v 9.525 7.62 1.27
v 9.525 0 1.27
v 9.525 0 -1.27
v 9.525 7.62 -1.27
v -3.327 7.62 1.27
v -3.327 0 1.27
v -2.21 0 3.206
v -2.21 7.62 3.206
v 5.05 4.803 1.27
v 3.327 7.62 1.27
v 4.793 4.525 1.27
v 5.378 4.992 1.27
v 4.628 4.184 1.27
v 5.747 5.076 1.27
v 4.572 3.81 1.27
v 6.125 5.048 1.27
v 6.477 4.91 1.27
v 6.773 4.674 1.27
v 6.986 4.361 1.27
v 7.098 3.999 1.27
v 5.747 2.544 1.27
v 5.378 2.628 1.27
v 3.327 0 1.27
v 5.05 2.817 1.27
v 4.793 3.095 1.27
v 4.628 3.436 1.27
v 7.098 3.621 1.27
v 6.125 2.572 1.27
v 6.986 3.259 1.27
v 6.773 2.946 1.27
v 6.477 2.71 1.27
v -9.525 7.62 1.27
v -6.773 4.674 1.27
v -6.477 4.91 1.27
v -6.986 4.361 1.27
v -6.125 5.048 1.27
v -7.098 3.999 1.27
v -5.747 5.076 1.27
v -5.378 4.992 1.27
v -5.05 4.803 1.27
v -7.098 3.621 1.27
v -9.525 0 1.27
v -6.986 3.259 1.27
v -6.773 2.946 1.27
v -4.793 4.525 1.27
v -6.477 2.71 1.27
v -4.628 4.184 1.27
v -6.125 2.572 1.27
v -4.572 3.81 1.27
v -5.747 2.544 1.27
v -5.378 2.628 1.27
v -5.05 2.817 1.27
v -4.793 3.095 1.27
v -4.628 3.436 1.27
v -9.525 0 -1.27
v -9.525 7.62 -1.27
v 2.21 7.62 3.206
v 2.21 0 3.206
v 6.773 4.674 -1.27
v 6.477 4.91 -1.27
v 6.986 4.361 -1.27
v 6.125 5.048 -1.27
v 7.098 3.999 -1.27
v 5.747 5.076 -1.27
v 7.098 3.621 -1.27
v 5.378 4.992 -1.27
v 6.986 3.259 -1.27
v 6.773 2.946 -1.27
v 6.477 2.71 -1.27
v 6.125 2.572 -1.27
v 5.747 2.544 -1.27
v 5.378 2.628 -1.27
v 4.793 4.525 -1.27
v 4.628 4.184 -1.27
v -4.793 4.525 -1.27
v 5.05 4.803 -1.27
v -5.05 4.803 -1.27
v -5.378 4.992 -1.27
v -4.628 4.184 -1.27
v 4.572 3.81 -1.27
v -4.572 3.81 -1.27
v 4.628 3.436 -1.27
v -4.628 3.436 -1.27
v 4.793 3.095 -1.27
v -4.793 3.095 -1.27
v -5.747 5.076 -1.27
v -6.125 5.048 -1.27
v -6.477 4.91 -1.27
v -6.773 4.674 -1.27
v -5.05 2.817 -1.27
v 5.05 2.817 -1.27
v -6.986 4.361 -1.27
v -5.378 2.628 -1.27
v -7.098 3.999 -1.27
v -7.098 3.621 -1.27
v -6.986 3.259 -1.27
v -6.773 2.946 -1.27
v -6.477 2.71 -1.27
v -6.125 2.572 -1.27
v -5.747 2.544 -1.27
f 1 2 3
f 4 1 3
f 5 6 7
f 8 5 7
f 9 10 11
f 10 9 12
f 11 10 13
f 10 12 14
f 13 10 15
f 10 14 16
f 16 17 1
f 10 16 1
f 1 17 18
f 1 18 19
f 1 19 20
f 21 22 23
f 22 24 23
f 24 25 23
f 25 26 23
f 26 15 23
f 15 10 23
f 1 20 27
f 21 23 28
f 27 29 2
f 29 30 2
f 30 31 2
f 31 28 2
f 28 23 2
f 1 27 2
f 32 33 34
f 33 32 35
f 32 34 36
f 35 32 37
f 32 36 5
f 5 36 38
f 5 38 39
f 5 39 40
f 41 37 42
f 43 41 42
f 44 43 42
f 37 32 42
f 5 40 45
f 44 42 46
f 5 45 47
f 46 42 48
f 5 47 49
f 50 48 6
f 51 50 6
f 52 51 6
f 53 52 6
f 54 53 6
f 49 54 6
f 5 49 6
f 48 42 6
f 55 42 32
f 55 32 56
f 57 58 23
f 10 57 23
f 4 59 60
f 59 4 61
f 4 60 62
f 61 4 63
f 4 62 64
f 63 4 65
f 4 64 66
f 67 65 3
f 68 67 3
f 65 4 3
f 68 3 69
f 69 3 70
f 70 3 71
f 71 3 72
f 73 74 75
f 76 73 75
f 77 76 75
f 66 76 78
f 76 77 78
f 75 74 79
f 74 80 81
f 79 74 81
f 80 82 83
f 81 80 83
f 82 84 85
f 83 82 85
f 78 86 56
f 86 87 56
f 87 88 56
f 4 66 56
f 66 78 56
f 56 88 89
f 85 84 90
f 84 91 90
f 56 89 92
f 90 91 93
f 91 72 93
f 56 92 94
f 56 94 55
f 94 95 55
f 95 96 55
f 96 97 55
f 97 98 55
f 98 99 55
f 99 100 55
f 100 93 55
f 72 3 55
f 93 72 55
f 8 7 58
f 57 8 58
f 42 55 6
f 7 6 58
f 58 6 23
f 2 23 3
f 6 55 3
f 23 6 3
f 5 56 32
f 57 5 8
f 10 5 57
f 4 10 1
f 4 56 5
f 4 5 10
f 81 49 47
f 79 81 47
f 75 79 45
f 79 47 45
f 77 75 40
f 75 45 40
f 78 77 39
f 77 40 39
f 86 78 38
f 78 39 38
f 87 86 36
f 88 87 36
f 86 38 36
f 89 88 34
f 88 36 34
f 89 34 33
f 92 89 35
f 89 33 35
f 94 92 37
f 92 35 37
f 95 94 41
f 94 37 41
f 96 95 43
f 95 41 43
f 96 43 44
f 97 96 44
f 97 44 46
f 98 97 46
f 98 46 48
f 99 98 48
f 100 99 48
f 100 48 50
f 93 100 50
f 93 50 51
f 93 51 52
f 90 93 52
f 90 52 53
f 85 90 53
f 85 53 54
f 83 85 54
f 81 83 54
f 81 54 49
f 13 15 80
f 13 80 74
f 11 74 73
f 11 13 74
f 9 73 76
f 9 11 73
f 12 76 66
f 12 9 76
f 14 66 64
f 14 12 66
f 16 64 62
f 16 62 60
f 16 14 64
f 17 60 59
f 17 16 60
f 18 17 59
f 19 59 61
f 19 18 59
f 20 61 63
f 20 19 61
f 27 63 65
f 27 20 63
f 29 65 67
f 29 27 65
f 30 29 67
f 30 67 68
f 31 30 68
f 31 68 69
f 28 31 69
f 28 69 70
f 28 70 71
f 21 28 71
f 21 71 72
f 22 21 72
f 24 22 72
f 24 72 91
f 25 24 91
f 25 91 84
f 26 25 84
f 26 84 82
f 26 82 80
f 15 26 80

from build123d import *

# Parameters (mm, degrees)
SKETCH1_W           = 6.1976
SKETCH1_H           = 2.54
BOSS_EXTRUDE1_DEPTH = 7.62
CUT_EXTRUDE2_REACH  = 14.993
SKETCH3_R           = 1.27


with BuildPart() as part:
    # Sketch1 → Boss-Extrude1 (new body)
    with BuildSketch(Plane(origin=(0, 0, 0), x_dir=(1, 0, 0), z_dir=(0, 1, 0))):
        Polygon((0, -3.205739983), (0, -1.27), (-3.3274, -1.27), (-2.2098, -3.205739983), align=None)
        Polygon((3.3274, -1.27), (0, -1.27), (0, -3.205739983), (2.2098, -3.205739983), align=None)
        with Locations((6.4262, 0)):
            Rectangle(SKETCH1_W, SKETCH1_H)
        Polygon((-3.3274, -1.27), (0, -1.27), (3.3274, -1.27), (3.3274, 1.27), (-3.3274, 1.27), align=None)
        with Locations((-6.4262, 0)):
            Rectangle(SKETCH1_W, SKETCH1_H)
    extrude(amount=BOSS_EXTRUDE1_DEPTH)

    # Sketch3 → Cut-Extrude2 (cut, up to next)
    with BuildSketch(Plane.XY.offset(3.205739983), mode=Mode.PRIVATE) as cut_extrude2_sk1:
        with Locations((-5.842, 3.81)):
            Circle(SKETCH3_R)
    cut_extrude2_tool1 = extrude(cut_extrude2_sk1.sketch, amount=-CUT_EXTRUDE2_REACH, mode=Mode.PRIVATE) & part.part
    cut_extrude2 = cut_extrude2_tool1.solids().sort_by_distance((-5.842, 3.81, 3.20574))[0]
    add(cut_extrude2, mode=Mode.SUBTRACT)

    # Mirror2: Cut-Extrude2 across plane
    add(cut_extrude2.mirror(Plane(origin=(0, 0, 0), x_dir=(0, 0, 1), z_dir=(1, 0, 0))), mode=Mode.SUBTRACT)


solid = part.part
